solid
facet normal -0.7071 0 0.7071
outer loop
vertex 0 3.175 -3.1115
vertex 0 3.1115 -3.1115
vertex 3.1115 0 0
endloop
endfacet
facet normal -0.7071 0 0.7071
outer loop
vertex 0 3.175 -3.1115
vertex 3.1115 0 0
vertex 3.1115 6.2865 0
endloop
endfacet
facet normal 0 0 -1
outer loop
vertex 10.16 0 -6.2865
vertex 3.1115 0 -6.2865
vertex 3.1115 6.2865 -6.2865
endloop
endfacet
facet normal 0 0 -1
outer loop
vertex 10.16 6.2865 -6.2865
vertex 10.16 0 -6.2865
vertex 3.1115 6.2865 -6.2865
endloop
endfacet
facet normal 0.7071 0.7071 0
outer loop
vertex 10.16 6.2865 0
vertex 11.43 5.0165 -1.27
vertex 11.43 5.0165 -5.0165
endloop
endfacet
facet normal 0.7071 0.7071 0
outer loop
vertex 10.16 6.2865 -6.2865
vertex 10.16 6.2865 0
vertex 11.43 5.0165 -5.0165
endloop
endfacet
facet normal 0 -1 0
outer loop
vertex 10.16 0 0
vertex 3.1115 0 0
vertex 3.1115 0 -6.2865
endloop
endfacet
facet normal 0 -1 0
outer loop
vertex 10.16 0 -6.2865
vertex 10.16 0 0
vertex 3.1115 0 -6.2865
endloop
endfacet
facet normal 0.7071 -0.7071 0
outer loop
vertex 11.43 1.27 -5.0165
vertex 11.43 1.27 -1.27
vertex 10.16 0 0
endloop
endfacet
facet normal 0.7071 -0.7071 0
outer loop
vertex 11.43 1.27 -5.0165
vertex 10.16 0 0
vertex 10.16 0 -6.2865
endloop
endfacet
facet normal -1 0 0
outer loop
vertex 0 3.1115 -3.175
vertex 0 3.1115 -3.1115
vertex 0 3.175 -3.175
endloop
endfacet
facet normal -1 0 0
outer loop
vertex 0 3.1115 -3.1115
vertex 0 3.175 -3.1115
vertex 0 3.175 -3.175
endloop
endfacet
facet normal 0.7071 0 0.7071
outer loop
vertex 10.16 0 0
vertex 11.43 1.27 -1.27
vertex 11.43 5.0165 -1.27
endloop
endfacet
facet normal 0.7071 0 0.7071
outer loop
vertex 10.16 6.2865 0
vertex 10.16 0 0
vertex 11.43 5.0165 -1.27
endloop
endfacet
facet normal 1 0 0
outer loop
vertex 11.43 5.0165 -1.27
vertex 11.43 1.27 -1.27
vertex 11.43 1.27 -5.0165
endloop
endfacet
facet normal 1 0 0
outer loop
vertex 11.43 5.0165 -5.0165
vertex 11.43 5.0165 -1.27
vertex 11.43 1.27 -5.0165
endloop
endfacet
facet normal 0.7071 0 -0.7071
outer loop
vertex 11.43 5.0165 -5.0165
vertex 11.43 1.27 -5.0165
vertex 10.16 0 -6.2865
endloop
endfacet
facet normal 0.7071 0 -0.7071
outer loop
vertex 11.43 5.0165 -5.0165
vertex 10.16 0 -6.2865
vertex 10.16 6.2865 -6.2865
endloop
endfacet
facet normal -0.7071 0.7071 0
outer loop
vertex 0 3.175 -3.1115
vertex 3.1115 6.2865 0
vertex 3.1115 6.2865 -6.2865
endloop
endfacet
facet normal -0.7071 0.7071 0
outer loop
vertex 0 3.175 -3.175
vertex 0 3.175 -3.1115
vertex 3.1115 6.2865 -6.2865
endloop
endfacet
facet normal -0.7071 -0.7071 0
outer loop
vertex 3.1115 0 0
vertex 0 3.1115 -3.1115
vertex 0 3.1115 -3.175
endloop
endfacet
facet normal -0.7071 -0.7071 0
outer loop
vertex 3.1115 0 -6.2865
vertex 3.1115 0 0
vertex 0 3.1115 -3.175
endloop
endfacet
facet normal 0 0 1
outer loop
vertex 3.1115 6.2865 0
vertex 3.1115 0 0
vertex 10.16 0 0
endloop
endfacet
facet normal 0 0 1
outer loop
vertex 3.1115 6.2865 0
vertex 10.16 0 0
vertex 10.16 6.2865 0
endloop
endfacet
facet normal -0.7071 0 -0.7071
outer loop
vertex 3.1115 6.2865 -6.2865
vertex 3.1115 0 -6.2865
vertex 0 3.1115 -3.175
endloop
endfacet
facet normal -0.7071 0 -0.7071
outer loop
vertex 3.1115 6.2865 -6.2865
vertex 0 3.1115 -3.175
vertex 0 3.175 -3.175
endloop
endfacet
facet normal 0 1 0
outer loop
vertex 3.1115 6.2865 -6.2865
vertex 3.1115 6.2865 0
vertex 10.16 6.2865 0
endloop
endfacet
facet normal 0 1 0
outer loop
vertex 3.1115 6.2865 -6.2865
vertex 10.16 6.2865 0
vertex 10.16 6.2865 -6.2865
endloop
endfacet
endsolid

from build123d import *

# Parameters (mm, degrees)
SKETCH1_W           = 6.2865
SKETCH1_H           = 6.2865
BOSS_EXTRUDE1_DEPTH = 11.43
CHAMFER1_SIZE       = 1.27
CHAMFER2_SIZE       = 3.1115


with BuildPart() as part:
    # Sketch1 → Boss-Extrude1 (new body)
    with BuildSketch(Plane(origin=(0, 0, 0), x_dir=(0, 0, -1), z_dir=(1, 0, 0))):
        with Locations((3.14325, 3.14325)):
            Rectangle(SKETCH1_W, SKETCH1_H)
    extrude(amount=BOSS_EXTRUDE1_DEPTH)

    # Chamfer1
    chamfer1_edges = [part.edges().sort_by_distance(p)[0] for p in [
        (11.43, 3.14325, -6.2865),
        (11.43, 0, -3.14325),
        (11.43, 3.14325, 0),
        (11.43, 6.2865, -3.14325),
    ]]
    chamfer(chamfer1_edges, length=CHAMFER1_SIZE)

    # Chamfer2
    chamfer2_edges = [part.edges().sort_by_distance(p)[0] for p in [
        (0, 0, -3.14325),
        (0, 3.14325, -6.2865),
        (0, 6.2865, -3.14325),
        (0, 3.14325, 0),
    ]]
    chamfer(chamfer2_edges, length=CHAMFER2_SIZE)


solid = part.part
